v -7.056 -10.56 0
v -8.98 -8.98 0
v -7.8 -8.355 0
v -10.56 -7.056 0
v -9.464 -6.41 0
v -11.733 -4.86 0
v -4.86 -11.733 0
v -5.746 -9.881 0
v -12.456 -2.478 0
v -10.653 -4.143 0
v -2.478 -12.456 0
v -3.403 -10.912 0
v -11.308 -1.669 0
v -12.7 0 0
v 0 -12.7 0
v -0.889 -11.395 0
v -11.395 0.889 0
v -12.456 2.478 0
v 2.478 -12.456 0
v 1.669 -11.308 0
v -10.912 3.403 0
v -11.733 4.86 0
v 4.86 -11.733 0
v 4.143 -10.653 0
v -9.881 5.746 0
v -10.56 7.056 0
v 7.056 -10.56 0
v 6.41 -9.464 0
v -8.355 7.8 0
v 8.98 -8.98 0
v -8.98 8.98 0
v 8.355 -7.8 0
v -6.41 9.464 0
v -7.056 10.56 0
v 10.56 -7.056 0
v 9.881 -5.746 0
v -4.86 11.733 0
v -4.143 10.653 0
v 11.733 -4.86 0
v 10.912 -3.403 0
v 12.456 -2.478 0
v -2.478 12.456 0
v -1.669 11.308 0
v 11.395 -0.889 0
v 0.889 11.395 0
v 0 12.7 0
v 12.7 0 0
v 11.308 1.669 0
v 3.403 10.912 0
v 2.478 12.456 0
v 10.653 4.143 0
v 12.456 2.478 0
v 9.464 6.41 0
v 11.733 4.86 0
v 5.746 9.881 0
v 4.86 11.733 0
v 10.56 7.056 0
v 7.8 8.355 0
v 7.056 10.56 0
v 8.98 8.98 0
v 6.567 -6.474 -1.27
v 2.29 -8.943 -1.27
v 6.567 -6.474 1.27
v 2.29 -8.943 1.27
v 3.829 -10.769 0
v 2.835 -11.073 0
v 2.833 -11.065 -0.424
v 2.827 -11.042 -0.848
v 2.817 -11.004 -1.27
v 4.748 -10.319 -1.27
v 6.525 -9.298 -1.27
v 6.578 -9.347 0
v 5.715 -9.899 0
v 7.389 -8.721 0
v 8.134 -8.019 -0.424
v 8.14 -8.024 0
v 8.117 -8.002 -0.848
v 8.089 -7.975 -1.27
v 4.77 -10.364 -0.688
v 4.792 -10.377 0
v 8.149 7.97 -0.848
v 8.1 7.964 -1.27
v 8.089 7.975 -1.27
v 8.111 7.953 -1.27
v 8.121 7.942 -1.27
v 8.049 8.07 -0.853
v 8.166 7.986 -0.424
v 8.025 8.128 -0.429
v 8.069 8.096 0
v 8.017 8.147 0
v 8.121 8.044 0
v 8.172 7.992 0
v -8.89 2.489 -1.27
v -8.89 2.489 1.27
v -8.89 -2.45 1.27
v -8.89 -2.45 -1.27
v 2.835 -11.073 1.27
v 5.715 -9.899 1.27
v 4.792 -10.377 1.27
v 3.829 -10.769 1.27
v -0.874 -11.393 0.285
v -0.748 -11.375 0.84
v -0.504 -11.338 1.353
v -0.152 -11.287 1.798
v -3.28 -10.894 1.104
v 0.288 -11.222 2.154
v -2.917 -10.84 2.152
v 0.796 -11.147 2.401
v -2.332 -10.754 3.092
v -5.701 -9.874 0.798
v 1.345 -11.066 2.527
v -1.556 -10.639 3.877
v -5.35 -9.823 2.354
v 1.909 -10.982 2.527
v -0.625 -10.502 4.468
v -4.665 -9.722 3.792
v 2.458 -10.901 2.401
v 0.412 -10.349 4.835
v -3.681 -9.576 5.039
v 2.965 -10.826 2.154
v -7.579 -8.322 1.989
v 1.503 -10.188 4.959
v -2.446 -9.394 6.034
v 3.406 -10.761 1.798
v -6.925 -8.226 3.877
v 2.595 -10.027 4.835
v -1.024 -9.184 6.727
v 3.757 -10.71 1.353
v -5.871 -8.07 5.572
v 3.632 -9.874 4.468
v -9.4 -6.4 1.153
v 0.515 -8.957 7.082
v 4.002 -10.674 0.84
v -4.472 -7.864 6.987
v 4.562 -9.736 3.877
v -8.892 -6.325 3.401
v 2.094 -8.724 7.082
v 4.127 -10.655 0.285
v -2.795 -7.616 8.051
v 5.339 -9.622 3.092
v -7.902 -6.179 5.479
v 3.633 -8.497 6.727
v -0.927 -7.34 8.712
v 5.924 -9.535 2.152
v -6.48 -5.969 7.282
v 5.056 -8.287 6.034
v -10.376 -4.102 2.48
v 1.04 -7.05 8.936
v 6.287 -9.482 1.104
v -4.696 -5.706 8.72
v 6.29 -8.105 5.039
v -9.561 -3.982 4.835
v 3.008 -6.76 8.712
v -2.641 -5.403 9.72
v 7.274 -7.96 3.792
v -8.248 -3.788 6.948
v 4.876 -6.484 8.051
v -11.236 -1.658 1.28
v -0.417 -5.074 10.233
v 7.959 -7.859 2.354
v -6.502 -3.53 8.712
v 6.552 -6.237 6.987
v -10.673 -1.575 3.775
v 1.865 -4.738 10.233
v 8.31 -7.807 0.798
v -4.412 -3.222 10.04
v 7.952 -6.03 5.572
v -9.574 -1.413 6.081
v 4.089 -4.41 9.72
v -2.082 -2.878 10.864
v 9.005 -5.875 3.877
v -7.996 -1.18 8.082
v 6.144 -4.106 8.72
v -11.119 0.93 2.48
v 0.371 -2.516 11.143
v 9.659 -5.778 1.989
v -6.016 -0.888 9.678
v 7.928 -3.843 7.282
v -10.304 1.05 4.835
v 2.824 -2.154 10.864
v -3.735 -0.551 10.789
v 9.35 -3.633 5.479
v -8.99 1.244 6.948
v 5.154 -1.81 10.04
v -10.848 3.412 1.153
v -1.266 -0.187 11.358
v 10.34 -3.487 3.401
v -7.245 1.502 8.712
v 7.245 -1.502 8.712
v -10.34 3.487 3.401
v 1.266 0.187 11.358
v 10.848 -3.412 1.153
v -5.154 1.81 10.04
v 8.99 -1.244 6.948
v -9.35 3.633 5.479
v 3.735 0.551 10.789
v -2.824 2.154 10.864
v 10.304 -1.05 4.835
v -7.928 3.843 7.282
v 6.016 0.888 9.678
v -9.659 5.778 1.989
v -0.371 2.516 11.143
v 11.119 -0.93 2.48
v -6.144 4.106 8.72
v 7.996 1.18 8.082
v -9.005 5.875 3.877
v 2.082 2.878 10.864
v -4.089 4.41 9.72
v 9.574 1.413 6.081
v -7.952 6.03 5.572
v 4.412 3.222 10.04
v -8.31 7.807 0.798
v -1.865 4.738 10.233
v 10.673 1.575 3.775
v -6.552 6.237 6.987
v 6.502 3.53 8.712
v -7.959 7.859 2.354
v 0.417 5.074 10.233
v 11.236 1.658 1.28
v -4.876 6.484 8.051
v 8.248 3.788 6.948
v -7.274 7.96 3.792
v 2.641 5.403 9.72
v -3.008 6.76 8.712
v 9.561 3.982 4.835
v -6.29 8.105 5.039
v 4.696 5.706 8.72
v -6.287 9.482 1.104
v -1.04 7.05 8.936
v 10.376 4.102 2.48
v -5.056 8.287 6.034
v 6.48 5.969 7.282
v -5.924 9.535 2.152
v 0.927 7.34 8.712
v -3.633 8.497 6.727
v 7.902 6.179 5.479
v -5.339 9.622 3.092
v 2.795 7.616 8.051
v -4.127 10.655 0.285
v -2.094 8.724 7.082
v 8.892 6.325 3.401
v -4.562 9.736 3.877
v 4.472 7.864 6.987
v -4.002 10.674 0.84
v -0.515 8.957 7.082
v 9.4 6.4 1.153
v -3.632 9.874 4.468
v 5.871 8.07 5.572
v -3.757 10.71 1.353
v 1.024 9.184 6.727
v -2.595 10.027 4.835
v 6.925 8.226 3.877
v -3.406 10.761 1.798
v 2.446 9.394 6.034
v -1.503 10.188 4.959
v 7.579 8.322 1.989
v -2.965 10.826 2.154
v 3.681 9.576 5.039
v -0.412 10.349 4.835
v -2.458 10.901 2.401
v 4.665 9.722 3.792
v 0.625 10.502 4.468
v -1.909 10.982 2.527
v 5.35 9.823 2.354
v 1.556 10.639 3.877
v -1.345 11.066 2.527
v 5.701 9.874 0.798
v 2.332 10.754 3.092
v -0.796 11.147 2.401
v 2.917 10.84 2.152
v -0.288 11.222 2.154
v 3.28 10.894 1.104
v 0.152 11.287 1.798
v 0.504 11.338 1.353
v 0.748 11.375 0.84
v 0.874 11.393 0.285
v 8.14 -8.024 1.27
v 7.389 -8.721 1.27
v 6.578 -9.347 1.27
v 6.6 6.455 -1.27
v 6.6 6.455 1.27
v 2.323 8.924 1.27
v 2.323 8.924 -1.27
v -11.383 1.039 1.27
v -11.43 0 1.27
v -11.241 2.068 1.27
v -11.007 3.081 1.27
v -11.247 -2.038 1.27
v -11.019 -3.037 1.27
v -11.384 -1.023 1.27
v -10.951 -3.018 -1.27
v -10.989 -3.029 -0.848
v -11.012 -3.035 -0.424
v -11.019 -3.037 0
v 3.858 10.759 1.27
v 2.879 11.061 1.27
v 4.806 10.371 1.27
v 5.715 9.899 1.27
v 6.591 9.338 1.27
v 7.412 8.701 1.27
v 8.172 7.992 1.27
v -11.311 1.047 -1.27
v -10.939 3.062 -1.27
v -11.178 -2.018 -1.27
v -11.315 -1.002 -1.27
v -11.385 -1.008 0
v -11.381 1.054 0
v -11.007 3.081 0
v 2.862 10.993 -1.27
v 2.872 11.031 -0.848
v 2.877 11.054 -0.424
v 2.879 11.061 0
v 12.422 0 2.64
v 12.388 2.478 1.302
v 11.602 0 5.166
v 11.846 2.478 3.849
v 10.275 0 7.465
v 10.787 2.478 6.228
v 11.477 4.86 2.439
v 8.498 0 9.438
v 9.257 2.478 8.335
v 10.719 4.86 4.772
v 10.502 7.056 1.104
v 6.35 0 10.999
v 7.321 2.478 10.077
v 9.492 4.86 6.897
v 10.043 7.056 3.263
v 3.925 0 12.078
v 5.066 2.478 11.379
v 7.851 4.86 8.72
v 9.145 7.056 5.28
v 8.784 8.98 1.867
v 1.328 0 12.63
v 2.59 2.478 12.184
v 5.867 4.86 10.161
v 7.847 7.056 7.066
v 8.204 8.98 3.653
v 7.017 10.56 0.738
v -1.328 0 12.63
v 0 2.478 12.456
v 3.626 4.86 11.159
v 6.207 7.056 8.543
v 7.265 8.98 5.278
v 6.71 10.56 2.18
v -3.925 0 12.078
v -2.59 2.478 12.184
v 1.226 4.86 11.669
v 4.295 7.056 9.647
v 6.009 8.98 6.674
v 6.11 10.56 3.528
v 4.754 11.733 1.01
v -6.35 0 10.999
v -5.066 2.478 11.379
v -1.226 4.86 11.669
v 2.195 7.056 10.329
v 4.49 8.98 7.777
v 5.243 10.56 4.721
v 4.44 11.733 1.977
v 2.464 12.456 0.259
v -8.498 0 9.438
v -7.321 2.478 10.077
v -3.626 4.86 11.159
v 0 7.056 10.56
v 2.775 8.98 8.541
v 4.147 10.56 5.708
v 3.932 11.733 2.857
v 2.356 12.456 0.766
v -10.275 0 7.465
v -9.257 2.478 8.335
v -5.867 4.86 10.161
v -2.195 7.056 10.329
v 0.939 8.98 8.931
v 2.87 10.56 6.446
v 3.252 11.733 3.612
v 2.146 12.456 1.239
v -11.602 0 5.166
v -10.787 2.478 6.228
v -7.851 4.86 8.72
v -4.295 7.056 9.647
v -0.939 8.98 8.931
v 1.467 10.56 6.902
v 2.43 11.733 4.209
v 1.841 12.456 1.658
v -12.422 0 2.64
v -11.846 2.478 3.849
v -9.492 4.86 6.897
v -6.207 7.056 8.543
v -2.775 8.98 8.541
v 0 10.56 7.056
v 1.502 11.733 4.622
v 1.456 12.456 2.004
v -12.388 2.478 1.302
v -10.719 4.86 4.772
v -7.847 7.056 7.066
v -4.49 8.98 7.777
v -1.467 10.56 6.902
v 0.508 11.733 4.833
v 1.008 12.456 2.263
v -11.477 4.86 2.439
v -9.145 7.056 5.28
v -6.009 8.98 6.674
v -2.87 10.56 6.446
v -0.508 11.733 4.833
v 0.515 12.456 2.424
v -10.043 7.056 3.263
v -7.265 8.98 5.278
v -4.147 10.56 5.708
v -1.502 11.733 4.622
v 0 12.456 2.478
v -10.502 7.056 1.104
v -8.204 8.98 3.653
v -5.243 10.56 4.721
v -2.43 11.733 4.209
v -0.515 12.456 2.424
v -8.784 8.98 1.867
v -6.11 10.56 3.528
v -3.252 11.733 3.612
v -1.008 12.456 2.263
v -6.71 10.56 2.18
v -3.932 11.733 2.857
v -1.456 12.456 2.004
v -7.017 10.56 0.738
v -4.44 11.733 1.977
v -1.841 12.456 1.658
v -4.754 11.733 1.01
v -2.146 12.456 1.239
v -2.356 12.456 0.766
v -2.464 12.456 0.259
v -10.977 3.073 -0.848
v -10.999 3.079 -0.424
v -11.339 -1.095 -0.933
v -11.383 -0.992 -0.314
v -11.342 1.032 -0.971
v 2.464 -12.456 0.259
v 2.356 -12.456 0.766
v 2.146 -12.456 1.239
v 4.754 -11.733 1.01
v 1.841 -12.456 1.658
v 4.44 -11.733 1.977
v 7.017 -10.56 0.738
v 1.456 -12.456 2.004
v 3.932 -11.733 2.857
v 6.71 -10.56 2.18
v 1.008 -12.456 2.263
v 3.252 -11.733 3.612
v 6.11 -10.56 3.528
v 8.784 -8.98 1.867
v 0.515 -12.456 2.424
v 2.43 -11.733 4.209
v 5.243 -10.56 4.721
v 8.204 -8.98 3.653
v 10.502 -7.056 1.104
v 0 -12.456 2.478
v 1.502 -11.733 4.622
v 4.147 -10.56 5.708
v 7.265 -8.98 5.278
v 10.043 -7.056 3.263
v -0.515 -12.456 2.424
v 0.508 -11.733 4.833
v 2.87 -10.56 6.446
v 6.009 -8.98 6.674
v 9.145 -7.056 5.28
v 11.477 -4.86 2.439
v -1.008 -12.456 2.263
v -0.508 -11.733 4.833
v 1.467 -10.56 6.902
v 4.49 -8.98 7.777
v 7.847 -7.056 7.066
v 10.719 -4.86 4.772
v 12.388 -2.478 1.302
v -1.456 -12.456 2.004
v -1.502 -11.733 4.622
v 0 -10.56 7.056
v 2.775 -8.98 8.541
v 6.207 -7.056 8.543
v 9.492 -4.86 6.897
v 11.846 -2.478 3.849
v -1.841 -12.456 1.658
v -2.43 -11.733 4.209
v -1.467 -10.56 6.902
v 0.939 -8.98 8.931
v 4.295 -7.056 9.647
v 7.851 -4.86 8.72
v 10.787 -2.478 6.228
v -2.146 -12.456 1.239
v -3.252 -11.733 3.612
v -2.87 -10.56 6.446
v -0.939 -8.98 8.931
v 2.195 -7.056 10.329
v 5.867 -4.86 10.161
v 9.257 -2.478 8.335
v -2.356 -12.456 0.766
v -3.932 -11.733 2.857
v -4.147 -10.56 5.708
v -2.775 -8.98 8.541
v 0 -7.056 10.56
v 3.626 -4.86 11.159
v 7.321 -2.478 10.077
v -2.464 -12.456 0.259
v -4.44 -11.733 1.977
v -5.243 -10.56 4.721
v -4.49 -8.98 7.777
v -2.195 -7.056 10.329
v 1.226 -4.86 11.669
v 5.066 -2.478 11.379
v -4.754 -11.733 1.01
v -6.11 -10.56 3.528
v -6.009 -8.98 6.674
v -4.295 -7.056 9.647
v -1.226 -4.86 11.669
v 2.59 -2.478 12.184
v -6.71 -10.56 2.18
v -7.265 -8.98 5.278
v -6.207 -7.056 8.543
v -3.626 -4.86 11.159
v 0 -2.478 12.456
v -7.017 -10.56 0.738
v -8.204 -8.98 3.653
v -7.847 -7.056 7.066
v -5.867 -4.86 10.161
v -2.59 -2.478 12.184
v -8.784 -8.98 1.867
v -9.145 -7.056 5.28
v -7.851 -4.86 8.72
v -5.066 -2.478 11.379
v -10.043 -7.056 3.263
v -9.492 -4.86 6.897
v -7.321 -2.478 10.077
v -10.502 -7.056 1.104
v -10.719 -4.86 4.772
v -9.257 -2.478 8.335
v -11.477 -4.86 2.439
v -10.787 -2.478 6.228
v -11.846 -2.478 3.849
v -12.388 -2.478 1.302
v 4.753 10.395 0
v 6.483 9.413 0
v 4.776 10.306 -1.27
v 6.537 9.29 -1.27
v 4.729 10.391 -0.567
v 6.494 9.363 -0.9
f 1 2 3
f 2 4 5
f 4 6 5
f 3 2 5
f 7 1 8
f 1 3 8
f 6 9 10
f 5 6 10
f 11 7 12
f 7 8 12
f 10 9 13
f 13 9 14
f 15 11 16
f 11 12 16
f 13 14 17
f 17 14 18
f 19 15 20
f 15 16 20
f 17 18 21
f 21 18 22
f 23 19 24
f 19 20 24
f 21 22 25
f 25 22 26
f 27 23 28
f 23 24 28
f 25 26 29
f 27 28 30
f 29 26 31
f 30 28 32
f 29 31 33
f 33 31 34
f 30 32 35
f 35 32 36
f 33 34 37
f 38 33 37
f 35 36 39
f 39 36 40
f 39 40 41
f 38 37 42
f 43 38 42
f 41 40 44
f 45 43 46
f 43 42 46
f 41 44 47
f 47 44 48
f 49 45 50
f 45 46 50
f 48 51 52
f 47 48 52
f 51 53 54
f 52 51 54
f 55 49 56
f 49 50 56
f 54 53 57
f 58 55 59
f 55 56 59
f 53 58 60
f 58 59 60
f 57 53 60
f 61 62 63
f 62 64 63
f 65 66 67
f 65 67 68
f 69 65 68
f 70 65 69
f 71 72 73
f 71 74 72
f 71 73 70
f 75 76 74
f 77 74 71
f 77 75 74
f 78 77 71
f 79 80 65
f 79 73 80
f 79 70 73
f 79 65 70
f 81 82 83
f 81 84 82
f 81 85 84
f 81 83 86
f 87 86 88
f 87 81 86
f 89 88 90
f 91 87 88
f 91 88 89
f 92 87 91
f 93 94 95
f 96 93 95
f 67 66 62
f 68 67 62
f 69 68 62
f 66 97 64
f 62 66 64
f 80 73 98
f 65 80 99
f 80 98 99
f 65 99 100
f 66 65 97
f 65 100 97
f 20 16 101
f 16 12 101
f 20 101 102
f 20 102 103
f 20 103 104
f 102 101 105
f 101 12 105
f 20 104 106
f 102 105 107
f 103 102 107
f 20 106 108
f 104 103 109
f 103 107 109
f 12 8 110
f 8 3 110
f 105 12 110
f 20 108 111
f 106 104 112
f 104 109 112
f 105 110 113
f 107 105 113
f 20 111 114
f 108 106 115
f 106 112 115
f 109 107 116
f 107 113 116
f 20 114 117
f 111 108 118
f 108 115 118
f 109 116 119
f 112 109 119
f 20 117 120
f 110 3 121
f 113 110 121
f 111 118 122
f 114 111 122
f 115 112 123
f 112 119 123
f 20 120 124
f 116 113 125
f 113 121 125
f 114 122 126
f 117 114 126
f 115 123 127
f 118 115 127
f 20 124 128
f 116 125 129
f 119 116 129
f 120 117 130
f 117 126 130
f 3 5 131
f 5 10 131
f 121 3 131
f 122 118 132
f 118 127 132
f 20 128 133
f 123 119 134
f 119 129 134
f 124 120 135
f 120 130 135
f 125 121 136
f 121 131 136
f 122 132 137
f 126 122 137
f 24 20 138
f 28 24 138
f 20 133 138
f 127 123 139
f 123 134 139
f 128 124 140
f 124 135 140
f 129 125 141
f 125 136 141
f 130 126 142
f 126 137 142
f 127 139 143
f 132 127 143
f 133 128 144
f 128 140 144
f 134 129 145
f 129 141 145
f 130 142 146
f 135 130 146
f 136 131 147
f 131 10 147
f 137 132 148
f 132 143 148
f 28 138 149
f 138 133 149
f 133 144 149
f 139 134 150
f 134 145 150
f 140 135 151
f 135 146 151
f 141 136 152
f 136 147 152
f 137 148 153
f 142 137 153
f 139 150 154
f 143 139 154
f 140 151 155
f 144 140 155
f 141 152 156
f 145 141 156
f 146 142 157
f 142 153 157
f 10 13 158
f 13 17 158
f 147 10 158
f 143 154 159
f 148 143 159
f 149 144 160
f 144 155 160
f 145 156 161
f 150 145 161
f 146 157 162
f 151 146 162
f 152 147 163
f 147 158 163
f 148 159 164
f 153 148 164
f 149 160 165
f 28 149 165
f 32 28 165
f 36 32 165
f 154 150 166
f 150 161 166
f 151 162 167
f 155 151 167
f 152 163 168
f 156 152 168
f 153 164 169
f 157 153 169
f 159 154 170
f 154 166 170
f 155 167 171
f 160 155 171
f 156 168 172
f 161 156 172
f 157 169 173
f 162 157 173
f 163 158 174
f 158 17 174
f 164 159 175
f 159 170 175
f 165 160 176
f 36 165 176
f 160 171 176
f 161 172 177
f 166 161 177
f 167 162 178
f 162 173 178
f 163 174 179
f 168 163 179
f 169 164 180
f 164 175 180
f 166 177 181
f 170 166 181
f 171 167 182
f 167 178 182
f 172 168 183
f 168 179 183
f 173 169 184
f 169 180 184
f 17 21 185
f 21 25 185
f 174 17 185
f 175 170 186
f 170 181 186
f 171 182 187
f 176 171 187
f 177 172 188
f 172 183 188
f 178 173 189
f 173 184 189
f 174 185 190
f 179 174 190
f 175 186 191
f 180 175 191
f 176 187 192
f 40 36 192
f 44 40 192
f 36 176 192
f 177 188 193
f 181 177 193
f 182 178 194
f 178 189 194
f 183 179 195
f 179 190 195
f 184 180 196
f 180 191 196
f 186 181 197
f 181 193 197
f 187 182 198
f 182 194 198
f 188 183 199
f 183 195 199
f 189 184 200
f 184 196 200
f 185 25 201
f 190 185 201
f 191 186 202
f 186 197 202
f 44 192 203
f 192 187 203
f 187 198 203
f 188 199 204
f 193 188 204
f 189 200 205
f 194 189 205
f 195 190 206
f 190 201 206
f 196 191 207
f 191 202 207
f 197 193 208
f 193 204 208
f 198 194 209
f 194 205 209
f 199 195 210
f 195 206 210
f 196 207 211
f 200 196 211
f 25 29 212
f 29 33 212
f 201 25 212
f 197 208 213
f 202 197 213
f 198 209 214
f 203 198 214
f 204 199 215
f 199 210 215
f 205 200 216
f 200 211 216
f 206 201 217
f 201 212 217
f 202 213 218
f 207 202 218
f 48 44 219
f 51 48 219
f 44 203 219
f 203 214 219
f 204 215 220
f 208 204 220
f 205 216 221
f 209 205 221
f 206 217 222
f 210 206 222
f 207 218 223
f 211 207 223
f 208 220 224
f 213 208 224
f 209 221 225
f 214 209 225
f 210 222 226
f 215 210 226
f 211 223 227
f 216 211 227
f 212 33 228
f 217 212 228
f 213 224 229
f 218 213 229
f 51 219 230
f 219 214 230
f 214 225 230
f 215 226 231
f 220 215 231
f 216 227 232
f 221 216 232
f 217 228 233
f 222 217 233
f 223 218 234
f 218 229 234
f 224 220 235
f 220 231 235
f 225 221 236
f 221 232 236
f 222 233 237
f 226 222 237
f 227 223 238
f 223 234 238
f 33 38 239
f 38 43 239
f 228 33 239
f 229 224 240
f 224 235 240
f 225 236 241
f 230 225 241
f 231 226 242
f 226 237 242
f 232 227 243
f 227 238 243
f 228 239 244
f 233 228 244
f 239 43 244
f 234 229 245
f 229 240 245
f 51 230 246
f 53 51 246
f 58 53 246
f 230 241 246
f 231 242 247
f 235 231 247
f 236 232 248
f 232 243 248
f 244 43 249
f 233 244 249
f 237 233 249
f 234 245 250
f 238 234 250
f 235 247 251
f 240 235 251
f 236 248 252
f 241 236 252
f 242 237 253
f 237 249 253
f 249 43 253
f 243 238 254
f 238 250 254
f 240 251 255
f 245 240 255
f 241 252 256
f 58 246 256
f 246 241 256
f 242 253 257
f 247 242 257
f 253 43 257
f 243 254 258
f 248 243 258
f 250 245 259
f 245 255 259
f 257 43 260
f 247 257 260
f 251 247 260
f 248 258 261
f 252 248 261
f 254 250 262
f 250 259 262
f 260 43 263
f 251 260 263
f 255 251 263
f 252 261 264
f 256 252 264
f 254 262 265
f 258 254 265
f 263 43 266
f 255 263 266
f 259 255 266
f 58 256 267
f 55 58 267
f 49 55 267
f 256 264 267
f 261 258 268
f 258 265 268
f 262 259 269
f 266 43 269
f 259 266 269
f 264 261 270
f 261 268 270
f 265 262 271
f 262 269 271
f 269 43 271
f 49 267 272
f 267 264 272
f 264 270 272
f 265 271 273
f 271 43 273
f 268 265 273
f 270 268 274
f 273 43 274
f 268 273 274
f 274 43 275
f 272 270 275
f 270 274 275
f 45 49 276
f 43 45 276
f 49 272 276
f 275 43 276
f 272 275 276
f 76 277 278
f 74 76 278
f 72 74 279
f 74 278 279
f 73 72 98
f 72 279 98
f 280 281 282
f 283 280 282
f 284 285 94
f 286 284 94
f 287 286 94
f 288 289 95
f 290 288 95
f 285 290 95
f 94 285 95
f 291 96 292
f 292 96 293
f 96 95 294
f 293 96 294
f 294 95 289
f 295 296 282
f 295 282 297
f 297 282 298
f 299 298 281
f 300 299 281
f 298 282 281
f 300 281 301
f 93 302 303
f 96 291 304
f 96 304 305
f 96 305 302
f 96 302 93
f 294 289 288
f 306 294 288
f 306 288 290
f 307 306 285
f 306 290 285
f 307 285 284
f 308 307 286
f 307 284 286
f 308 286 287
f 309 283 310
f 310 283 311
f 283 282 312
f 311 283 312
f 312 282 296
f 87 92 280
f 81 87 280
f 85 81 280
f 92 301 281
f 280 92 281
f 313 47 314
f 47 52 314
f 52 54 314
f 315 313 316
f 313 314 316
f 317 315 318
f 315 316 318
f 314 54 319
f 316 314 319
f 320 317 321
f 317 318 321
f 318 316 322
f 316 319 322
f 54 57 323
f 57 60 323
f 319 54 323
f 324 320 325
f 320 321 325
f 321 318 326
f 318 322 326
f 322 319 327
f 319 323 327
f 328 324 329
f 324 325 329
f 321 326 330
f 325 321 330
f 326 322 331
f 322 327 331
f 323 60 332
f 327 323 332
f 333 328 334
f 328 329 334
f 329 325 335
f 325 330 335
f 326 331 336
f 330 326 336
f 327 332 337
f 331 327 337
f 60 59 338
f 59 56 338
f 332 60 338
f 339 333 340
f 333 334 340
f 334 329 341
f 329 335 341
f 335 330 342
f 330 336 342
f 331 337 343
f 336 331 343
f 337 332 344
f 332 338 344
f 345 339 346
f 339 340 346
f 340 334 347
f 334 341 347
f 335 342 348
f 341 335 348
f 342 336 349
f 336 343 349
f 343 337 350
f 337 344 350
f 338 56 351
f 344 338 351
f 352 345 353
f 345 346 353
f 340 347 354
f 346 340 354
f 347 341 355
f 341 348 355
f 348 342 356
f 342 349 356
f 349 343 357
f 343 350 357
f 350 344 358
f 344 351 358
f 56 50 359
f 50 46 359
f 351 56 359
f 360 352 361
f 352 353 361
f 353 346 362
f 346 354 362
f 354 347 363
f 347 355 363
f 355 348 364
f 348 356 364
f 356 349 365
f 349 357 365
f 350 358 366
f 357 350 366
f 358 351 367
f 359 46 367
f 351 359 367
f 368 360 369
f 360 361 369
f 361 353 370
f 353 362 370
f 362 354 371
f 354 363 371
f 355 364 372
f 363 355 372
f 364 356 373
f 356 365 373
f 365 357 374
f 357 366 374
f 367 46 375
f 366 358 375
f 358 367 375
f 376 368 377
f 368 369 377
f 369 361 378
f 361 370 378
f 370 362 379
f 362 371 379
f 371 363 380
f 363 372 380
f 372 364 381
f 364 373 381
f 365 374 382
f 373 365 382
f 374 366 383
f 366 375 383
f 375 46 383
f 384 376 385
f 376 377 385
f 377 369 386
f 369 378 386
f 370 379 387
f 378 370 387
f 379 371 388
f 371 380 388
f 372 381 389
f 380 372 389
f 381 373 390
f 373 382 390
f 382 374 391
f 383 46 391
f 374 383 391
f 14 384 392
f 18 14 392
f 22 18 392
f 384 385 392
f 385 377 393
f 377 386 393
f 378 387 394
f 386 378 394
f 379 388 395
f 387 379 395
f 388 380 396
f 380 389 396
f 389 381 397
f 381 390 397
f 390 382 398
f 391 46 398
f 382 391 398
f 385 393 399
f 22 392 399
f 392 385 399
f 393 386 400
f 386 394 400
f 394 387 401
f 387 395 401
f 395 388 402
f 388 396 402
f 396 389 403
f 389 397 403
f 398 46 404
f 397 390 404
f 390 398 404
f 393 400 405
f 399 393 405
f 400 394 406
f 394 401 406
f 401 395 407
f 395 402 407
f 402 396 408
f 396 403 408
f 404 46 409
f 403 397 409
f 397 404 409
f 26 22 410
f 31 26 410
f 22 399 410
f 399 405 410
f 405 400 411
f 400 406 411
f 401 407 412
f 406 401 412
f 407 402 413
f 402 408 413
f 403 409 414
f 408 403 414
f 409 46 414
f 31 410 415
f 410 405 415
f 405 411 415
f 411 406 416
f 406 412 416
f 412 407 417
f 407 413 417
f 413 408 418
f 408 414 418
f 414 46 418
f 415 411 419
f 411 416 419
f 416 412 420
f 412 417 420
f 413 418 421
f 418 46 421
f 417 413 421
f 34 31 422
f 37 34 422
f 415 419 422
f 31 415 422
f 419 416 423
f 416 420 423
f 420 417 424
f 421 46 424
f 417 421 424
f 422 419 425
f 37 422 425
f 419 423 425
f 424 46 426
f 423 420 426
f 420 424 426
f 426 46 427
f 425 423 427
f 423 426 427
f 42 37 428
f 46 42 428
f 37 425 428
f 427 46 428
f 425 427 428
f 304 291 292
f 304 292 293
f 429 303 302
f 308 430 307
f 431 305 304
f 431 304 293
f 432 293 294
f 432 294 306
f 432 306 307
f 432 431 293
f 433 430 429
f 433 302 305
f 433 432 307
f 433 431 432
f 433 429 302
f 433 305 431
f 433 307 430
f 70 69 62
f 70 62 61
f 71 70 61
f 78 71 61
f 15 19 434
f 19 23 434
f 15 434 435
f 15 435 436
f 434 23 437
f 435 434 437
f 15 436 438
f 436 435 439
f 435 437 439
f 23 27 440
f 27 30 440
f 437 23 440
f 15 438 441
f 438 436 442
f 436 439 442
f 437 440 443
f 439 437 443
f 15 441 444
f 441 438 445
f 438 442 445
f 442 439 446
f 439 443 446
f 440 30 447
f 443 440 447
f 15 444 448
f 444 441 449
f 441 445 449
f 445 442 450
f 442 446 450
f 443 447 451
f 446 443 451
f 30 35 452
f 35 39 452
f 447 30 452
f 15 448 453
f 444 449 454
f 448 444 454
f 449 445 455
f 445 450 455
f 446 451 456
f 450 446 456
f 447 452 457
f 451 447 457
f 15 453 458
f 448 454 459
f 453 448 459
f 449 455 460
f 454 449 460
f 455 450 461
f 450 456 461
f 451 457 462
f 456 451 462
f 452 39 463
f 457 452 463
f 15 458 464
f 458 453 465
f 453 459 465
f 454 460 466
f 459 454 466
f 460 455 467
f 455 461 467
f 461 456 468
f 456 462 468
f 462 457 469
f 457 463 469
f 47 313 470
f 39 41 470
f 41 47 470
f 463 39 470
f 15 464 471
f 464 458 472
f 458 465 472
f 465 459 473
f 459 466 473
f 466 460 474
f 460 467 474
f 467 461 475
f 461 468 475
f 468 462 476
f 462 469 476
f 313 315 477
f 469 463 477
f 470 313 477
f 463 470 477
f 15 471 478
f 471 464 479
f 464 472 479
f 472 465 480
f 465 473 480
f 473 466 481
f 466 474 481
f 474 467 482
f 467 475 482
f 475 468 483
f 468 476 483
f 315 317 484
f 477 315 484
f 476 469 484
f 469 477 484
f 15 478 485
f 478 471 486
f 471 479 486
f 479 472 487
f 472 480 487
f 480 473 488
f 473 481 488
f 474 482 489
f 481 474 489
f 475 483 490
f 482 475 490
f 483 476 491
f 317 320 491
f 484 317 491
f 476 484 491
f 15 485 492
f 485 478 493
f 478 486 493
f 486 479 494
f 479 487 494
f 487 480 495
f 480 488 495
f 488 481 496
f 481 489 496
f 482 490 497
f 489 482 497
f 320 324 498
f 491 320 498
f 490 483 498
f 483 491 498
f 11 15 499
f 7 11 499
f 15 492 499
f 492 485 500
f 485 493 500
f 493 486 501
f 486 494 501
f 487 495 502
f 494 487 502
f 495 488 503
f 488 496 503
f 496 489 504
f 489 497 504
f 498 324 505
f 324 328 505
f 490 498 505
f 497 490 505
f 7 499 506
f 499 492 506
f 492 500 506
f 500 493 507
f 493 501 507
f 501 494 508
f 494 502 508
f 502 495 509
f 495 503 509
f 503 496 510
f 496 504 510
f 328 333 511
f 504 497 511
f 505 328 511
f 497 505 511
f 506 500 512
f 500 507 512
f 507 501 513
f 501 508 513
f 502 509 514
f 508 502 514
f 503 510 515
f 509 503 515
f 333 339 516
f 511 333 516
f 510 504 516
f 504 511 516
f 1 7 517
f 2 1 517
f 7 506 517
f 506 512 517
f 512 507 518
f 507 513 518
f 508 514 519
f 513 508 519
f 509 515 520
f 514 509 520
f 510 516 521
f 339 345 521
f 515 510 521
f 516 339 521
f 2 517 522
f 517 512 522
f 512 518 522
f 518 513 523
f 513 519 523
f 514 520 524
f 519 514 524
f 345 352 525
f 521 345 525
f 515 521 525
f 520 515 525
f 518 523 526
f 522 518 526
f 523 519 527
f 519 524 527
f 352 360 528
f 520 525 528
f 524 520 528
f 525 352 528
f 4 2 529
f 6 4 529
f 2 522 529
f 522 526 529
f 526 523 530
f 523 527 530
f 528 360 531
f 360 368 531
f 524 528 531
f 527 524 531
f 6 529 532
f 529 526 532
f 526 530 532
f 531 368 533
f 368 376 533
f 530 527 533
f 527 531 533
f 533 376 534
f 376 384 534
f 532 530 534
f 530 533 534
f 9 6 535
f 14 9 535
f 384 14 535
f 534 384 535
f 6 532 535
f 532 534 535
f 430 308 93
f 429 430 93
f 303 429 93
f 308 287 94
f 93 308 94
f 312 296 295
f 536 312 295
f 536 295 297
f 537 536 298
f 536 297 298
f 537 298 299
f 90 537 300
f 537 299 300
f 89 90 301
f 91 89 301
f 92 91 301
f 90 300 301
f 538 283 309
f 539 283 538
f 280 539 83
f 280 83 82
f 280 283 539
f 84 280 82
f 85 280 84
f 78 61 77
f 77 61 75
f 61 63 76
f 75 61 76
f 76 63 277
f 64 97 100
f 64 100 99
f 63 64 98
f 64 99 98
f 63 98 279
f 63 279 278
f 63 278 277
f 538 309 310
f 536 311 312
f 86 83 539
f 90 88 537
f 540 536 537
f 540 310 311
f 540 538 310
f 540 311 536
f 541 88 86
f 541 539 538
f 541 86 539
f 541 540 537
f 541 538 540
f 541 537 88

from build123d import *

# Parameters (mm, degrees)
F1_ANGLE      = 180
F3_ANGLE      = 197.782
F5_DEPTH      = 1.27
F5_DEPTH_BACK = 1.27
F7_ANGLE      = 180


with BuildPart() as f1:
    # F0 (on Top) → F1 (revolve)
    with BuildSketch(Plane.XY):
        with BuildLine():
            ThreePointArc((0, -12.7), (8.9802561211, -8.9802561211), (12.7, 0))
            ThreePointArc((12.7, 0), (8.9802561211, 8.9802561211), (0, 12.7))
            Line((0, 12.7), (0, -12.7))
        make_face()
    revolve(axis=Axis((0, 0, 0), (0, -1, 0)), revolution_arc=F1_ANGLE)

    # F2 (on face) → F3 (revolve, cut)
    with BuildSketch(Plane(origin=(0, 0, 0), x_dir=(1, 0, 0), z_dir=(0, 0, -1))):
        with BuildLine():
            Line((-1.66864879, -11.307542227), (1.66864879, 11.307542227))
            ThreePointArc((1.66864879, 11.307542227), (-11.307542227, 1.66864879), (-1.66864879, -11.307542227))
        make_face()
    revolve(axis=Axis((0, 0, 0), (-0.1459885206, 0.9892862841, 0)), revolution_arc=F3_ANGLE, mode=Mode.SUBTRACT)


with BuildPart() as f5:
    # F4 (on face) → F5 (new body, two sides)
    with BuildSketch(Plane(origin=(0, 0, 0), x_dir=(1, 0, 0), z_dir=(0, 0, -1))) as f5_sk:
        with BuildLine():
            ThreePointArc((-11.0191410151, 3.0370102552), (-11.3268195404, 1.5323377888), (-11.43, 0))
            ThreePointArc((-11.43, 0), (-11.3237160387, -1.55510613), (-11.0068407567, -3.0812913782))
            Line((-11.0068407567, -3.0812913782), (-8.89, -2.4886959808))
            Line((-8.89, -2.4886959808), (-8.89, 2.4501929081))
            Line((-8.89, 2.4501929081), (-11.0191410151, 3.0370102552))
        make_face()
    extrude(amount=-F5_DEPTH)
    extrude(f5_sk.sketch, amount=F5_DEPTH_BACK)


with BuildPart() as f5b:
    # F4 (on face) → F5, piece 2 (new body, two sides)
    with BuildSketch(Plane(origin=(0, 0, 0), x_dir=(1, 0, 0), z_dir=(0, 0, -1))) as f5_2_sk:
        with BuildLine():
            Line((2.3230706974, -8.9240622937), (2.879442475, -11.0613611745))
            ThreePointArc((2.879442475, -11.0613611745), (4.33636634, -10.5754823514), (5.7150000412, -9.8986703415))
            ThreePointArc((5.7150000412, -9.8986703415), (7.0086194523, -9.0290726751), (8.1718969883, -7.9915580216))
            Line((8.1718969883, -7.9915580216), (6.6002739417, -6.4546178493))
            Line((6.6002739417, -6.4546178493), (2.3230706974, -8.9240622937))
        make_face()
    extrude(amount=-F5_DEPTH)
    extrude(f5_2_sk.sketch, amount=F5_DEPTH_BACK)


with BuildPart() as f5c:
    # F4 (on face) → F5, piece 3 (new body, two sides)
    with BuildSketch(Plane(origin=(0, 0, 0), x_dir=(1, 0, 0), z_dir=(0, 0, -1))) as f5_3_sk:
        with BuildLine():
            ThreePointArc((5.7150008731, 9.8986698612), (4.3150970719, 10.5841786294), (2.8349437683, 11.0728493998))
            Line((2.8349437683, 11.0728493998), (2.2897260583, 8.94331383))
            Line((2.2897260583, 8.94331383), (6.5669293026, 6.4738693856))
            Line((6.5669293026, 6.4738693856), (8.1396985401, 8.0243509193))
            ThreePointArc((8.1396985401, 8.0243509193), (6.9904536213, 9.0431442634), (5.7150008731, 9.8986698612))
        make_face()
    extrude(amount=-F5_DEPTH)
    extrude(f5_3_sk.sketch, amount=F5_DEPTH_BACK)


with BuildPart() as f7_tool:
    # F6 (on face) → F7 (revolve)
    with BuildSketch(Plane(origin=(0, 0, 0), x_dir=(1, 0, 0), z_dir=(0, 0, -1))):
        with BuildLine():
            ThreePointArc((1.66864879, 11.307542227), (8.6520967305, 7.4690107889), (11.43, 0))
            ThreePointArc((11.43, 0), (11.2058571362, -2.2524799319), (10.5422194499, -4.4166173787))
            Line((10.5422194499, -4.4166173787), (11.7135771666, -4.907352643))
            ThreePointArc((11.7135771666, -4.907352643), (10.5738682271, 7.034437484), (0, 12.7))
            ThreePointArc((0, 12.7), (-7.034437484, 10.5738682271), (-11.7135771666, 4.907352643))
            Line((-11.7135771666, 4.907352643), (-10.5422194499, 4.4166173787))
            ThreePointArc((-10.5422194499, 4.4166173787), (-5.6174972524, 9.9543269295), (1.66864879, 11.307542227))
        make_face()
        with BuildLine():
            ThreePointArc((0, 12.7), (10.5738682271, 7.034437484), (11.7135771666, -4.907352643))
            Line((11.7135771666, -4.907352643), (23.4271543331, -9.814705286))
            ThreePointArc((23.4271543331, -9.814705286), (24.901904747, -5.0055109599), (25.4, 0))
            ThreePointArc((25.4, 0), (5.0055109599, 24.901904747), (-23.4271543331, 9.814705286))
            Line((-23.4271543331, 9.814705286), (-11.7135771666, 4.907352643))
            ThreePointArc((-11.7135771666, 4.907352643), (-7.034437484, 10.5738682271), (0, 12.7))
        make_face()
    revolve(axis=Axis((0, 0, 0), (0.9223289108, 0.3864057199, 0)), revolution_arc=F7_ANGLE)


with BuildPart() as f5_1:
    add(f5.part)

    # F7: cut by f7_tool
    add(f7_tool.part, mode=Mode.SUBTRACT)


with BuildPart() as f5b_1:
    add(f5b.part)

    # F7: cut by f7_tool
    add(f7_tool.part, mode=Mode.SUBTRACT)


with BuildPart() as f5c_1:
    add(f5c.part)

    # F7: cut by f7_tool
    add(f7_tool.part, mode=Mode.SUBTRACT)


solid = Compound([f1.part, f5_1.part, f5b_1.part, f5c_1.part])
